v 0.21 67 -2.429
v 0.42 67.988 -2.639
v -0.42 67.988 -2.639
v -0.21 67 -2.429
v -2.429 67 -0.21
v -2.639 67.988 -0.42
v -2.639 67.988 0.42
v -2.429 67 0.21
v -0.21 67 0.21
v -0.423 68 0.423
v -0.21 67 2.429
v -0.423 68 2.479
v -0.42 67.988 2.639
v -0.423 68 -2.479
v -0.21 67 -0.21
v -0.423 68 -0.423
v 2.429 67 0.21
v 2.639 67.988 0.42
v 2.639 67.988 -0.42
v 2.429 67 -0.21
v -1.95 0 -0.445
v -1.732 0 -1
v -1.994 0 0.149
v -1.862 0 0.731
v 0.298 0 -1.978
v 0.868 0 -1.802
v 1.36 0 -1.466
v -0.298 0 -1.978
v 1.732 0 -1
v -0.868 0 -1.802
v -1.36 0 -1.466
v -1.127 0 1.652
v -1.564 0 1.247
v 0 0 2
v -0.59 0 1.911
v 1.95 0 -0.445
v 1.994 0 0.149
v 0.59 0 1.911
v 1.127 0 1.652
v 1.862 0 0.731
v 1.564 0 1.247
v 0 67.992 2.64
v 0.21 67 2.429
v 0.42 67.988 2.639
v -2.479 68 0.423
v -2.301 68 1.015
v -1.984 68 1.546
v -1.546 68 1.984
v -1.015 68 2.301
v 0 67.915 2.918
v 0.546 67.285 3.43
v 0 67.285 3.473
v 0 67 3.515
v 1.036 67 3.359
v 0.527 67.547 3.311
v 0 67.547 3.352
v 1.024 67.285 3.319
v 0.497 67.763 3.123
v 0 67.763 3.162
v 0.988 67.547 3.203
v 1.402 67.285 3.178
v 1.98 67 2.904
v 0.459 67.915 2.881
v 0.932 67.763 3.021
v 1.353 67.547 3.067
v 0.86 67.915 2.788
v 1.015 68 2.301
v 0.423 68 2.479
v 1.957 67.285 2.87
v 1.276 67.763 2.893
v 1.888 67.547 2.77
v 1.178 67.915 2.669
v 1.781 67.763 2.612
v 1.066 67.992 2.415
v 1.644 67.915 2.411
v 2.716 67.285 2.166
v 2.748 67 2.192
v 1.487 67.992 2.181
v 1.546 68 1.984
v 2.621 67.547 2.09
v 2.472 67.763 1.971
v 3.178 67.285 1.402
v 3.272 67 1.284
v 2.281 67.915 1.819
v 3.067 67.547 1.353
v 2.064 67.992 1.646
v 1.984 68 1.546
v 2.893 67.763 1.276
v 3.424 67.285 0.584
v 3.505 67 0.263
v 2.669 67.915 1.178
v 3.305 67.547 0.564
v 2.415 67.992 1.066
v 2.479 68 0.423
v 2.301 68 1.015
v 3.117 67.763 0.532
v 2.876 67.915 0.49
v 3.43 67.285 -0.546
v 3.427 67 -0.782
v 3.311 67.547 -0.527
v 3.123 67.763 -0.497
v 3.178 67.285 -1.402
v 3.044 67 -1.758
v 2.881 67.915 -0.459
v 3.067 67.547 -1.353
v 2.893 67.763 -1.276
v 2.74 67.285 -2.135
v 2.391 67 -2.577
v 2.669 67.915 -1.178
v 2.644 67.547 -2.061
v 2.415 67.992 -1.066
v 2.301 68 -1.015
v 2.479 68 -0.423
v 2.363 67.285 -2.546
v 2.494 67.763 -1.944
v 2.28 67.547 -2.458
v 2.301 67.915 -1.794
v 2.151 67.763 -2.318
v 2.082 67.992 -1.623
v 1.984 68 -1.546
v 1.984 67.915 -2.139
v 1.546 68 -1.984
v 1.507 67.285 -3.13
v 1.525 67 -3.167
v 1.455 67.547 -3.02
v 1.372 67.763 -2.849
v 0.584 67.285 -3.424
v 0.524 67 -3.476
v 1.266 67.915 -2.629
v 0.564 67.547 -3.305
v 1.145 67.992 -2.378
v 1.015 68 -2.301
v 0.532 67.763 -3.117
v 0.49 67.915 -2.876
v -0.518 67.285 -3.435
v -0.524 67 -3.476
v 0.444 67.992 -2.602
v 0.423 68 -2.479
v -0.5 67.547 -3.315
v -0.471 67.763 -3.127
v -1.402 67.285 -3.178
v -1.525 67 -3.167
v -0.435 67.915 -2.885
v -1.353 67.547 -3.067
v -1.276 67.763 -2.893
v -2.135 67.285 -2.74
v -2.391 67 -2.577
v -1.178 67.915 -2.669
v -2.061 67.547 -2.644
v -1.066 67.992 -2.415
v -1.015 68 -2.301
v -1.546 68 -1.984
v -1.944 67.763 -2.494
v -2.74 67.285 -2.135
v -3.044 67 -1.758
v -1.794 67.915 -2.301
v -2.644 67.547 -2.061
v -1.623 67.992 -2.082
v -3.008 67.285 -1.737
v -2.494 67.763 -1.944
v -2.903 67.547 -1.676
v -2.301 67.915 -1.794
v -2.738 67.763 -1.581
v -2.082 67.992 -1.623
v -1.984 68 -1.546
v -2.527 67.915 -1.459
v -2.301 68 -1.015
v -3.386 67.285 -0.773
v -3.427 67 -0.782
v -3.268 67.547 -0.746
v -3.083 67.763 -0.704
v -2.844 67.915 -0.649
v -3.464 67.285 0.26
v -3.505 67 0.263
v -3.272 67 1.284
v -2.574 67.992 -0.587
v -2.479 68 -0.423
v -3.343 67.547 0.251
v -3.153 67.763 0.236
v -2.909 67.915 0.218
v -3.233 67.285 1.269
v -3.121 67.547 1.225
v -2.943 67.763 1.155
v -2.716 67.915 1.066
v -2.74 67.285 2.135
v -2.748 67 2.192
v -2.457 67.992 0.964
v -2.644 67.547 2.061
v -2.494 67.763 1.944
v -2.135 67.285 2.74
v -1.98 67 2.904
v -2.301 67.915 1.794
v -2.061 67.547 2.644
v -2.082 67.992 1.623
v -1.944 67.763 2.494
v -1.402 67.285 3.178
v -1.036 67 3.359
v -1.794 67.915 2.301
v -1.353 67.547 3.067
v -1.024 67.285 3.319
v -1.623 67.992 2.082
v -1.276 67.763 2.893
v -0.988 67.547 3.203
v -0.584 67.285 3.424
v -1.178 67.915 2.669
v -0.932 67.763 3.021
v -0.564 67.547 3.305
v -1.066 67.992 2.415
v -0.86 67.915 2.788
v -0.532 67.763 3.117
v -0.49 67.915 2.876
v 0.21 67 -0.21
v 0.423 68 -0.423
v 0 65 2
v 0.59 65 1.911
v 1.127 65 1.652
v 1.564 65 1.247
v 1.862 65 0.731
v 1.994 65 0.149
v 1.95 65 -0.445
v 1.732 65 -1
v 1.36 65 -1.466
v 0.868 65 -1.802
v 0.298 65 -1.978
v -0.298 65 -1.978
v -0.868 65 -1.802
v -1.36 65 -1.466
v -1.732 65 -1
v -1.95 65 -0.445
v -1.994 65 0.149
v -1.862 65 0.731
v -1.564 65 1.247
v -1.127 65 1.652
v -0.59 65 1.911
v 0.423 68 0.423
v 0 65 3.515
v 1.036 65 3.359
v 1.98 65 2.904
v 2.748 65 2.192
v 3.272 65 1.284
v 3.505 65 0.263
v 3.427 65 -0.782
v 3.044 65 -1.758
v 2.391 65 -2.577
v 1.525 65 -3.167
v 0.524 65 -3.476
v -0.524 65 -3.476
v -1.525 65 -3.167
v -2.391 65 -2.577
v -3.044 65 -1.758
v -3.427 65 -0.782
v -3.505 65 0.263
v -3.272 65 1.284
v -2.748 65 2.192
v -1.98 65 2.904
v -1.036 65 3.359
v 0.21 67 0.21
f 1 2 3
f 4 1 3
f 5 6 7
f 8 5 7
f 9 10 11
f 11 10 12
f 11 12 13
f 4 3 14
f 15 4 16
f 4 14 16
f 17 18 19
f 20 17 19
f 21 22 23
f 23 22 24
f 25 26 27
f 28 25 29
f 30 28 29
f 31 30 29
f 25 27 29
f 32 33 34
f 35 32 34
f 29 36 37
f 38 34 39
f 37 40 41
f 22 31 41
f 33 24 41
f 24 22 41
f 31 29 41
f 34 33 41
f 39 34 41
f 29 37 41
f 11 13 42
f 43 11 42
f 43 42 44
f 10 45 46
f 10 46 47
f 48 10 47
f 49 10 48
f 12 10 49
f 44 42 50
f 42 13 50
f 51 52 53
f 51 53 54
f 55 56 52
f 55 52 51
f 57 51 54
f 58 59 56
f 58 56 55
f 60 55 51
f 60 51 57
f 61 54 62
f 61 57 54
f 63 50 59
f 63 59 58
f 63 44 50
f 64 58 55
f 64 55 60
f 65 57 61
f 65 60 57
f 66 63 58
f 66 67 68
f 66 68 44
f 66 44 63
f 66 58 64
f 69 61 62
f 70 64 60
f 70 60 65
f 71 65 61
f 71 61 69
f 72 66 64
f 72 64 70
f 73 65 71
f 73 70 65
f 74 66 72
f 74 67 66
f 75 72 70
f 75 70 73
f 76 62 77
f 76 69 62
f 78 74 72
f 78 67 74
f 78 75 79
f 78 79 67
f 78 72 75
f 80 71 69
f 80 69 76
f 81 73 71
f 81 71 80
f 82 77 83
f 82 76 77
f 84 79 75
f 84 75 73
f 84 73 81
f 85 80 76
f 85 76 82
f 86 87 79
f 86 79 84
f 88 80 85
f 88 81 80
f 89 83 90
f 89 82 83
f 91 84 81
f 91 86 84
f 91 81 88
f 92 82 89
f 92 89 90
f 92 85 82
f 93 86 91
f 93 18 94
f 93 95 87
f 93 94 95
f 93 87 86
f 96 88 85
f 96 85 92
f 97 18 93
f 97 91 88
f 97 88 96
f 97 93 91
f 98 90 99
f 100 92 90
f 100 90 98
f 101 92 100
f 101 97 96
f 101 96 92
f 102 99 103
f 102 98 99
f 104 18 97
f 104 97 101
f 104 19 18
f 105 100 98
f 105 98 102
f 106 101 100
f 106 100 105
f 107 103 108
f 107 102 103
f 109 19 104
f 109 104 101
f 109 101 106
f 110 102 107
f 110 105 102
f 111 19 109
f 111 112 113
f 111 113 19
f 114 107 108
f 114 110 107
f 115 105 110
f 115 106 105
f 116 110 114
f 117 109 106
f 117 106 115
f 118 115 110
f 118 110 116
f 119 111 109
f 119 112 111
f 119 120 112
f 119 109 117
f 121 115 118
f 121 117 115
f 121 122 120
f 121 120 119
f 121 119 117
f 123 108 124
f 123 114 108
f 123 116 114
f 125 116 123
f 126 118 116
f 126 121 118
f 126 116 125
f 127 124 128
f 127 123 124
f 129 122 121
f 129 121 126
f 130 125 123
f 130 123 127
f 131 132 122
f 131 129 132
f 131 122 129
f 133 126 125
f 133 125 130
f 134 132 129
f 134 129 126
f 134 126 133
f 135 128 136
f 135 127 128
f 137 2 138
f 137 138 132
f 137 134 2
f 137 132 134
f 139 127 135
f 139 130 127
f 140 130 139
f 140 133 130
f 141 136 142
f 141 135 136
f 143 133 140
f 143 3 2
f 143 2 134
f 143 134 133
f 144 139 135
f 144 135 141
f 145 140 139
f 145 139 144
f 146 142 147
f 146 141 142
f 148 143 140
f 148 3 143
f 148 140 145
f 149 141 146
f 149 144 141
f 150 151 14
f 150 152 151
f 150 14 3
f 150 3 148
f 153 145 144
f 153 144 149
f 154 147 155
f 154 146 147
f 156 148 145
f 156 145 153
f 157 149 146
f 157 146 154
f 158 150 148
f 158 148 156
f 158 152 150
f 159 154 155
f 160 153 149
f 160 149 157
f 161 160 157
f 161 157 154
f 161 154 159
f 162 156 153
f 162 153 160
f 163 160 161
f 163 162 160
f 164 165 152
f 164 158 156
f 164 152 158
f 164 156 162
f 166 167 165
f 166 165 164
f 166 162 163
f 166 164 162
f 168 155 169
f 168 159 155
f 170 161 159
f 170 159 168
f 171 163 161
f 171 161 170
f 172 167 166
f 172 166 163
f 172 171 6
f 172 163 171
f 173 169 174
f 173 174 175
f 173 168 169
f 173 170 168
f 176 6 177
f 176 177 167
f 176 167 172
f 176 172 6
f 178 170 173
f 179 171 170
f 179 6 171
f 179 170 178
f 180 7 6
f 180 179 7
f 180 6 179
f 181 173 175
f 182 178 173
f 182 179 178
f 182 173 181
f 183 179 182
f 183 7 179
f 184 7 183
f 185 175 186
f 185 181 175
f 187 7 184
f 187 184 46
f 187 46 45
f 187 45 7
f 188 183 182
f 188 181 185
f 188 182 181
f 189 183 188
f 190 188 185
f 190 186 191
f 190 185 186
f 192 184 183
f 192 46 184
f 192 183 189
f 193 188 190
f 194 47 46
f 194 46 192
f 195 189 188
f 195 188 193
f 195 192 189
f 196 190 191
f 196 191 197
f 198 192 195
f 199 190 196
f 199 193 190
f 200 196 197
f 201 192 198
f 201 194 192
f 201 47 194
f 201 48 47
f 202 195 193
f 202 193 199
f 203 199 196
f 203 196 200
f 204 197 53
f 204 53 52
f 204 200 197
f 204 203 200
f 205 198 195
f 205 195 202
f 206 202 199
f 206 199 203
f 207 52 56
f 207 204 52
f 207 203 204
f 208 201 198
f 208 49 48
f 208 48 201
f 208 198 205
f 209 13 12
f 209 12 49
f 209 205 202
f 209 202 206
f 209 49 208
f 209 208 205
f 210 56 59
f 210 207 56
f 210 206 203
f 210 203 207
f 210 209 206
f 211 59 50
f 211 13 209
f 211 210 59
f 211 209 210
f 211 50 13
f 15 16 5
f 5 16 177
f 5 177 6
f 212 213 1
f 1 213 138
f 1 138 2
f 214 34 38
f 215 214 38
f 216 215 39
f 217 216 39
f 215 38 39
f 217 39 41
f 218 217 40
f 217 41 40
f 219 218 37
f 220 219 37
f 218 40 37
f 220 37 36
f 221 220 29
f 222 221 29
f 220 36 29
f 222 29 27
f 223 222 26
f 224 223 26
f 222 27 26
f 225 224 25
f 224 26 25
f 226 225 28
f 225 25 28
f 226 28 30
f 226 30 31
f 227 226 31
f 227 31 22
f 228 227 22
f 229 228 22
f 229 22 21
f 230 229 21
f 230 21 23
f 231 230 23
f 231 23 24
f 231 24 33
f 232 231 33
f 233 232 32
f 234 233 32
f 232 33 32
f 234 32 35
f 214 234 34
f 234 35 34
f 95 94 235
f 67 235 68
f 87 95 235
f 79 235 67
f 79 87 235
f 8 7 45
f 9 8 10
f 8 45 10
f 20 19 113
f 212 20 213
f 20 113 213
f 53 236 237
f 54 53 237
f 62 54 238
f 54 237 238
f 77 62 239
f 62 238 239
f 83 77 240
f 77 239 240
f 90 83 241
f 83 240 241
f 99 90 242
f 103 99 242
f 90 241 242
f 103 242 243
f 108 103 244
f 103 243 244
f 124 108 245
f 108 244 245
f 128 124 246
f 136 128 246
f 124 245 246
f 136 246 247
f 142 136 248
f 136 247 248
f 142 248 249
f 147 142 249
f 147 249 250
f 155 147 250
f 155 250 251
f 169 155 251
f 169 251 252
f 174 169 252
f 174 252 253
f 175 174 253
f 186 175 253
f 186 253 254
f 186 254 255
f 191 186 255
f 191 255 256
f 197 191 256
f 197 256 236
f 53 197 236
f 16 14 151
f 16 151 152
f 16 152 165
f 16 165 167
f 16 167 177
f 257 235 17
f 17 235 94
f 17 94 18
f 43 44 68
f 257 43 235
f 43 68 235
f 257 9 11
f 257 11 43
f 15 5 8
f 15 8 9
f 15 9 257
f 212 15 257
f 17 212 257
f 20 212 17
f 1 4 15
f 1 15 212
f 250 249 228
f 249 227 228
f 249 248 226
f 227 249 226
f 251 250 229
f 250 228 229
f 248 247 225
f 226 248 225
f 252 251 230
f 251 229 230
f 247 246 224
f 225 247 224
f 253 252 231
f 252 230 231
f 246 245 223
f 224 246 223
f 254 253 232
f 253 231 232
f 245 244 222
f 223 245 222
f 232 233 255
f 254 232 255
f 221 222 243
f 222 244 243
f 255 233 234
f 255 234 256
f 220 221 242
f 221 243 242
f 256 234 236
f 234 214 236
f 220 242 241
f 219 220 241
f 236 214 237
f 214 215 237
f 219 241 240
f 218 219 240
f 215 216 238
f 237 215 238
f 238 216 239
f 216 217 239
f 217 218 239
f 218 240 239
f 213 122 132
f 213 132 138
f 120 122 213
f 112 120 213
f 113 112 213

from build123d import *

# Parameters (mm, degrees)
SKETCH_1_R          = 2
EXTRUDE_1_DEPTH     = 65
SKETCH_2_R          = 3.515
EXTRUDE_2_DEPTH     = 3
CUT_EXTRUDE_1_DEPTH = 1
CUT_EXTRUDE_1_DRAFT = -12
FILLET_2_R          = 1


with BuildPart() as part:
    # Эскиз1 → Бобышка-Вытянуть1 (new body)
    with BuildSketch(Plane(origin=(0, 0, 0), x_dir=(1, 0, 0), z_dir=(0, 1, 0))):
        with Locations(Location((0, 0, 0), (0, 0, 270))):
            Circle(SKETCH_1_R)
    extrude(amount=EXTRUDE_1_DEPTH)

    # Эскиз2 → Бобышка-Вытянуть2 (add)
    with BuildSketch(Plane(origin=(0, 65, 0), x_dir=(1, 0, 0), z_dir=(0, 1, 0))):
        with Locations(Location((0, 0, 0), (0, 0, 270))):
            Circle(SKETCH_2_R)
    extrude(amount=EXTRUDE_2_DEPTH)


with BuildPart() as cut_extrude_1_tool:
    # Эскиз3 → Вырез-Вытянуть1 (with draft: the straight prism first)
    with BuildSketch(Plane(origin=(0, 68, 0), x_dir=(1, 0, 0), z_dir=(0, 1, 0))):
        Polygon((-2.641549473, 0.422769916), (-2.641549473, -0.422769916), (-0.422769916, -0.422769916), (-0.422769916, -2.641549473), (0.422769916, -2.641549473), (0.422769916, -0.422769916), (2.641549473, -0.422769916), (2.641549473, 0.422769916), (0.422769916, 0.422769916), (0.422769916, 2.641549473), (-0.422769916, 2.641549473), (-0.422769916, 0.422769916), align=None)
    extrude(amount=-CUT_EXTRUDE_1_DEPTH)
    # Вырез-Вытянуть1: the draft: its side faces are tilted about the plane it starts from
    cut_extrude_1_sides = [cut_extrude_1_tool.faces().sort_by_distance(p)[0] for p in [
        (-2.641549473, 67.5, 0),
        (-1.532159694, 67.5, 0.422769916),
        (-0.422769916, 67.5, 1.532159694),
        (0, 67.5, 2.641549473),
        (0.422769916, 67.5, 1.532159694),
        (1.532159694, 67.5, 0.422769916),
        (2.641549473, 67.5, 0),
        (1.532159694, 67.5, -0.422769916),
        (0.422769916, 67.5, -1.532159694),
        (0, 67.5, -2.641549473),
        (-0.422769916, 67.5, -1.532159694),
        (-1.532159694, 67.5, -0.422769916),
    ]]
    draft(cut_extrude_1_sides, Plane(origin=(0, 68, 0), x_dir=(1, 0, 0), z_dir=(0, 1, 0)), CUT_EXTRUDE_1_DRAFT)


with BuildPart() as part_1:
    add(part.part)

    # Вырез-Вытянуть1: cut by cut_extrude_1_tool
    add(cut_extrude_1_tool.part, mode=Mode.SUBTRACT)

    # Скругление2
    # the kernel refuses this fillet: 1 mm, written as the material it takes off along each edge
    with BuildSketch(Plane(origin=(0, 68, 0), x_dir=(0, 0, 1), z_dir=(-1, 0, 0))) as fillet_2_piece_1:
        with BuildLine():
            CenterArc((3.515 - FILLET_2_R, -FILLET_2_R), FILLET_2_R, 0, 90)
            Line((3.515 - FILLET_2_R, 0), (3.515, 0))
            Line((3.515, 0), (3.515, -FILLET_2_R))
        make_face()
    revolve(axis=Axis((0, 68, 0), (0, 1, 0)), mode=Mode.SUBTRACT)


solid = part_1.part
